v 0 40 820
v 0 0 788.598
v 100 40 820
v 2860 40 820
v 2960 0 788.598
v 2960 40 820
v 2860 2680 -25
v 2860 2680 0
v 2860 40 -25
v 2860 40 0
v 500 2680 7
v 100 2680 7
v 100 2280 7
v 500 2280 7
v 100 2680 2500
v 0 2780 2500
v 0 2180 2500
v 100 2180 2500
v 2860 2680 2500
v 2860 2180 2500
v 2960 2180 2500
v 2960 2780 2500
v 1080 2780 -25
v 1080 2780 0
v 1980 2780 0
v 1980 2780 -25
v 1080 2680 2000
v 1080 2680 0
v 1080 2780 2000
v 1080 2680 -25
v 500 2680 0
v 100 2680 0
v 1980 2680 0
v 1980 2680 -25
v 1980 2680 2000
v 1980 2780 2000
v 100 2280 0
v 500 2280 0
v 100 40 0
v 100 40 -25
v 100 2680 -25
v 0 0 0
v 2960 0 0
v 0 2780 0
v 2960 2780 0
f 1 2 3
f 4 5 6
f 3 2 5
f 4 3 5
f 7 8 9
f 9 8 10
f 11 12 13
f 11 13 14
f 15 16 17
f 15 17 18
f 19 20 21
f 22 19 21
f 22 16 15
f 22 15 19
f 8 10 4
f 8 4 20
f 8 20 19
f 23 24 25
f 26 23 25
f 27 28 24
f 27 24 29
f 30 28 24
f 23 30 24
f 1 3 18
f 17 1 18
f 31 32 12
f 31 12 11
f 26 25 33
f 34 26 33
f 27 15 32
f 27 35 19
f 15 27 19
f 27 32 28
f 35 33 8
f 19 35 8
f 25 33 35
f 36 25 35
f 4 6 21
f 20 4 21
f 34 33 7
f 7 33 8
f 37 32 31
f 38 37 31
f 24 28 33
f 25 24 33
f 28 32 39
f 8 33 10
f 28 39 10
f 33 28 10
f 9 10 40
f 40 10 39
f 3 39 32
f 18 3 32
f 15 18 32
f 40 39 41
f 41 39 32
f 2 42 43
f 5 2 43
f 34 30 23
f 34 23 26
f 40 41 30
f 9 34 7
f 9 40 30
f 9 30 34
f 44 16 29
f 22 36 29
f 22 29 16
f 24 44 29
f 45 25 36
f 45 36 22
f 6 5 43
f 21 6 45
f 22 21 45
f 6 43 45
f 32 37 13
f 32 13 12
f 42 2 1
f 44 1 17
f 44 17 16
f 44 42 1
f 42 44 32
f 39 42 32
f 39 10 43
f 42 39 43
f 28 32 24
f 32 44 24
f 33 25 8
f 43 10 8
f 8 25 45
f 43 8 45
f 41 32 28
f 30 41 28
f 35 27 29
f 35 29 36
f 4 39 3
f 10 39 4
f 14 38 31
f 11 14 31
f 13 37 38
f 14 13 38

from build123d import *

# Parameters (mm, degrees)
F0_W      = 2960
F0_H      = 2780
F0_W_2    = 2760
F0_H_2    = 2640
F1_DEPTH  = 2500
F2_W      = 900
F2_H      = 2000
F3_DEPTH  = 100
F5_DEPTH  = 25
F7_DEPTH  = 2960.001
F8_DEPTH  = 2960
F9_W      = 400
F9_H      = 400
F10_DEPTH = 7


with BuildPart() as f1:
    # F0 (on Top) → F1 (new body)
    with BuildSketch(Plane.XY):
        with Locations((1480, 1390)):
            Rectangle(F0_W, F0_H)
        with Locations((1480, 1360)):
            Rectangle(F0_W_2, F0_H_2, mode=Mode.SUBTRACT)
    extrude(amount=F1_DEPTH)

    # F2 (on face) → F3 (cut, through all)
    with BuildSketch(Plane.XZ.offset(-2680)):
        with Locations((1530, 1000)):
            Rectangle(F2_W, F2_H)
    extrude(amount=-F3_DEPTH, mode=Mode.SUBTRACT)

    # F6 (on face) → F7 (cut, through all)
    with BuildSketch(Plane.YZ.offset(2960)):
        Polygon((0, 2500), (0, 820), (40, 820), (2180, 2500), align=None)
    extrude(amount=-F7_DEPTH, mode=Mode.SUBTRACT)

    # F6 (on face) → F8 (cut, through all)
    with BuildSketch(Plane.YZ.offset(2960)):
        Polygon((40, 820), (0, 820), (0, 788.598131), align=None)
    extrude(amount=-F8_DEPTH, mode=Mode.SUBTRACT)


with BuildPart() as f5:
    # F4 (on face) → F5 (new body)
    with BuildSketch(Plane(origin=(0, 0, 0), x_dir=(1, 0, 0), z_dir=(0, 0, -1))):
        Polygon((1080, -2680), (1080, -2780), (1980, -2780), (1980, -2680), (2860, -2680), (2860, -40), (100, -40), (100, -2680), align=None)
    extrude(amount=F5_DEPTH)


with BuildPart() as f10:
    # F9 (on face) → F10 (new body)
    with BuildSketch(Plane.XY):
        with Locations((300, 2480)):
            Rectangle(F9_W, F9_H)
    extrude(amount=F10_DEPTH)


solid = Compound([f1.part, f5.part, f10.part])
